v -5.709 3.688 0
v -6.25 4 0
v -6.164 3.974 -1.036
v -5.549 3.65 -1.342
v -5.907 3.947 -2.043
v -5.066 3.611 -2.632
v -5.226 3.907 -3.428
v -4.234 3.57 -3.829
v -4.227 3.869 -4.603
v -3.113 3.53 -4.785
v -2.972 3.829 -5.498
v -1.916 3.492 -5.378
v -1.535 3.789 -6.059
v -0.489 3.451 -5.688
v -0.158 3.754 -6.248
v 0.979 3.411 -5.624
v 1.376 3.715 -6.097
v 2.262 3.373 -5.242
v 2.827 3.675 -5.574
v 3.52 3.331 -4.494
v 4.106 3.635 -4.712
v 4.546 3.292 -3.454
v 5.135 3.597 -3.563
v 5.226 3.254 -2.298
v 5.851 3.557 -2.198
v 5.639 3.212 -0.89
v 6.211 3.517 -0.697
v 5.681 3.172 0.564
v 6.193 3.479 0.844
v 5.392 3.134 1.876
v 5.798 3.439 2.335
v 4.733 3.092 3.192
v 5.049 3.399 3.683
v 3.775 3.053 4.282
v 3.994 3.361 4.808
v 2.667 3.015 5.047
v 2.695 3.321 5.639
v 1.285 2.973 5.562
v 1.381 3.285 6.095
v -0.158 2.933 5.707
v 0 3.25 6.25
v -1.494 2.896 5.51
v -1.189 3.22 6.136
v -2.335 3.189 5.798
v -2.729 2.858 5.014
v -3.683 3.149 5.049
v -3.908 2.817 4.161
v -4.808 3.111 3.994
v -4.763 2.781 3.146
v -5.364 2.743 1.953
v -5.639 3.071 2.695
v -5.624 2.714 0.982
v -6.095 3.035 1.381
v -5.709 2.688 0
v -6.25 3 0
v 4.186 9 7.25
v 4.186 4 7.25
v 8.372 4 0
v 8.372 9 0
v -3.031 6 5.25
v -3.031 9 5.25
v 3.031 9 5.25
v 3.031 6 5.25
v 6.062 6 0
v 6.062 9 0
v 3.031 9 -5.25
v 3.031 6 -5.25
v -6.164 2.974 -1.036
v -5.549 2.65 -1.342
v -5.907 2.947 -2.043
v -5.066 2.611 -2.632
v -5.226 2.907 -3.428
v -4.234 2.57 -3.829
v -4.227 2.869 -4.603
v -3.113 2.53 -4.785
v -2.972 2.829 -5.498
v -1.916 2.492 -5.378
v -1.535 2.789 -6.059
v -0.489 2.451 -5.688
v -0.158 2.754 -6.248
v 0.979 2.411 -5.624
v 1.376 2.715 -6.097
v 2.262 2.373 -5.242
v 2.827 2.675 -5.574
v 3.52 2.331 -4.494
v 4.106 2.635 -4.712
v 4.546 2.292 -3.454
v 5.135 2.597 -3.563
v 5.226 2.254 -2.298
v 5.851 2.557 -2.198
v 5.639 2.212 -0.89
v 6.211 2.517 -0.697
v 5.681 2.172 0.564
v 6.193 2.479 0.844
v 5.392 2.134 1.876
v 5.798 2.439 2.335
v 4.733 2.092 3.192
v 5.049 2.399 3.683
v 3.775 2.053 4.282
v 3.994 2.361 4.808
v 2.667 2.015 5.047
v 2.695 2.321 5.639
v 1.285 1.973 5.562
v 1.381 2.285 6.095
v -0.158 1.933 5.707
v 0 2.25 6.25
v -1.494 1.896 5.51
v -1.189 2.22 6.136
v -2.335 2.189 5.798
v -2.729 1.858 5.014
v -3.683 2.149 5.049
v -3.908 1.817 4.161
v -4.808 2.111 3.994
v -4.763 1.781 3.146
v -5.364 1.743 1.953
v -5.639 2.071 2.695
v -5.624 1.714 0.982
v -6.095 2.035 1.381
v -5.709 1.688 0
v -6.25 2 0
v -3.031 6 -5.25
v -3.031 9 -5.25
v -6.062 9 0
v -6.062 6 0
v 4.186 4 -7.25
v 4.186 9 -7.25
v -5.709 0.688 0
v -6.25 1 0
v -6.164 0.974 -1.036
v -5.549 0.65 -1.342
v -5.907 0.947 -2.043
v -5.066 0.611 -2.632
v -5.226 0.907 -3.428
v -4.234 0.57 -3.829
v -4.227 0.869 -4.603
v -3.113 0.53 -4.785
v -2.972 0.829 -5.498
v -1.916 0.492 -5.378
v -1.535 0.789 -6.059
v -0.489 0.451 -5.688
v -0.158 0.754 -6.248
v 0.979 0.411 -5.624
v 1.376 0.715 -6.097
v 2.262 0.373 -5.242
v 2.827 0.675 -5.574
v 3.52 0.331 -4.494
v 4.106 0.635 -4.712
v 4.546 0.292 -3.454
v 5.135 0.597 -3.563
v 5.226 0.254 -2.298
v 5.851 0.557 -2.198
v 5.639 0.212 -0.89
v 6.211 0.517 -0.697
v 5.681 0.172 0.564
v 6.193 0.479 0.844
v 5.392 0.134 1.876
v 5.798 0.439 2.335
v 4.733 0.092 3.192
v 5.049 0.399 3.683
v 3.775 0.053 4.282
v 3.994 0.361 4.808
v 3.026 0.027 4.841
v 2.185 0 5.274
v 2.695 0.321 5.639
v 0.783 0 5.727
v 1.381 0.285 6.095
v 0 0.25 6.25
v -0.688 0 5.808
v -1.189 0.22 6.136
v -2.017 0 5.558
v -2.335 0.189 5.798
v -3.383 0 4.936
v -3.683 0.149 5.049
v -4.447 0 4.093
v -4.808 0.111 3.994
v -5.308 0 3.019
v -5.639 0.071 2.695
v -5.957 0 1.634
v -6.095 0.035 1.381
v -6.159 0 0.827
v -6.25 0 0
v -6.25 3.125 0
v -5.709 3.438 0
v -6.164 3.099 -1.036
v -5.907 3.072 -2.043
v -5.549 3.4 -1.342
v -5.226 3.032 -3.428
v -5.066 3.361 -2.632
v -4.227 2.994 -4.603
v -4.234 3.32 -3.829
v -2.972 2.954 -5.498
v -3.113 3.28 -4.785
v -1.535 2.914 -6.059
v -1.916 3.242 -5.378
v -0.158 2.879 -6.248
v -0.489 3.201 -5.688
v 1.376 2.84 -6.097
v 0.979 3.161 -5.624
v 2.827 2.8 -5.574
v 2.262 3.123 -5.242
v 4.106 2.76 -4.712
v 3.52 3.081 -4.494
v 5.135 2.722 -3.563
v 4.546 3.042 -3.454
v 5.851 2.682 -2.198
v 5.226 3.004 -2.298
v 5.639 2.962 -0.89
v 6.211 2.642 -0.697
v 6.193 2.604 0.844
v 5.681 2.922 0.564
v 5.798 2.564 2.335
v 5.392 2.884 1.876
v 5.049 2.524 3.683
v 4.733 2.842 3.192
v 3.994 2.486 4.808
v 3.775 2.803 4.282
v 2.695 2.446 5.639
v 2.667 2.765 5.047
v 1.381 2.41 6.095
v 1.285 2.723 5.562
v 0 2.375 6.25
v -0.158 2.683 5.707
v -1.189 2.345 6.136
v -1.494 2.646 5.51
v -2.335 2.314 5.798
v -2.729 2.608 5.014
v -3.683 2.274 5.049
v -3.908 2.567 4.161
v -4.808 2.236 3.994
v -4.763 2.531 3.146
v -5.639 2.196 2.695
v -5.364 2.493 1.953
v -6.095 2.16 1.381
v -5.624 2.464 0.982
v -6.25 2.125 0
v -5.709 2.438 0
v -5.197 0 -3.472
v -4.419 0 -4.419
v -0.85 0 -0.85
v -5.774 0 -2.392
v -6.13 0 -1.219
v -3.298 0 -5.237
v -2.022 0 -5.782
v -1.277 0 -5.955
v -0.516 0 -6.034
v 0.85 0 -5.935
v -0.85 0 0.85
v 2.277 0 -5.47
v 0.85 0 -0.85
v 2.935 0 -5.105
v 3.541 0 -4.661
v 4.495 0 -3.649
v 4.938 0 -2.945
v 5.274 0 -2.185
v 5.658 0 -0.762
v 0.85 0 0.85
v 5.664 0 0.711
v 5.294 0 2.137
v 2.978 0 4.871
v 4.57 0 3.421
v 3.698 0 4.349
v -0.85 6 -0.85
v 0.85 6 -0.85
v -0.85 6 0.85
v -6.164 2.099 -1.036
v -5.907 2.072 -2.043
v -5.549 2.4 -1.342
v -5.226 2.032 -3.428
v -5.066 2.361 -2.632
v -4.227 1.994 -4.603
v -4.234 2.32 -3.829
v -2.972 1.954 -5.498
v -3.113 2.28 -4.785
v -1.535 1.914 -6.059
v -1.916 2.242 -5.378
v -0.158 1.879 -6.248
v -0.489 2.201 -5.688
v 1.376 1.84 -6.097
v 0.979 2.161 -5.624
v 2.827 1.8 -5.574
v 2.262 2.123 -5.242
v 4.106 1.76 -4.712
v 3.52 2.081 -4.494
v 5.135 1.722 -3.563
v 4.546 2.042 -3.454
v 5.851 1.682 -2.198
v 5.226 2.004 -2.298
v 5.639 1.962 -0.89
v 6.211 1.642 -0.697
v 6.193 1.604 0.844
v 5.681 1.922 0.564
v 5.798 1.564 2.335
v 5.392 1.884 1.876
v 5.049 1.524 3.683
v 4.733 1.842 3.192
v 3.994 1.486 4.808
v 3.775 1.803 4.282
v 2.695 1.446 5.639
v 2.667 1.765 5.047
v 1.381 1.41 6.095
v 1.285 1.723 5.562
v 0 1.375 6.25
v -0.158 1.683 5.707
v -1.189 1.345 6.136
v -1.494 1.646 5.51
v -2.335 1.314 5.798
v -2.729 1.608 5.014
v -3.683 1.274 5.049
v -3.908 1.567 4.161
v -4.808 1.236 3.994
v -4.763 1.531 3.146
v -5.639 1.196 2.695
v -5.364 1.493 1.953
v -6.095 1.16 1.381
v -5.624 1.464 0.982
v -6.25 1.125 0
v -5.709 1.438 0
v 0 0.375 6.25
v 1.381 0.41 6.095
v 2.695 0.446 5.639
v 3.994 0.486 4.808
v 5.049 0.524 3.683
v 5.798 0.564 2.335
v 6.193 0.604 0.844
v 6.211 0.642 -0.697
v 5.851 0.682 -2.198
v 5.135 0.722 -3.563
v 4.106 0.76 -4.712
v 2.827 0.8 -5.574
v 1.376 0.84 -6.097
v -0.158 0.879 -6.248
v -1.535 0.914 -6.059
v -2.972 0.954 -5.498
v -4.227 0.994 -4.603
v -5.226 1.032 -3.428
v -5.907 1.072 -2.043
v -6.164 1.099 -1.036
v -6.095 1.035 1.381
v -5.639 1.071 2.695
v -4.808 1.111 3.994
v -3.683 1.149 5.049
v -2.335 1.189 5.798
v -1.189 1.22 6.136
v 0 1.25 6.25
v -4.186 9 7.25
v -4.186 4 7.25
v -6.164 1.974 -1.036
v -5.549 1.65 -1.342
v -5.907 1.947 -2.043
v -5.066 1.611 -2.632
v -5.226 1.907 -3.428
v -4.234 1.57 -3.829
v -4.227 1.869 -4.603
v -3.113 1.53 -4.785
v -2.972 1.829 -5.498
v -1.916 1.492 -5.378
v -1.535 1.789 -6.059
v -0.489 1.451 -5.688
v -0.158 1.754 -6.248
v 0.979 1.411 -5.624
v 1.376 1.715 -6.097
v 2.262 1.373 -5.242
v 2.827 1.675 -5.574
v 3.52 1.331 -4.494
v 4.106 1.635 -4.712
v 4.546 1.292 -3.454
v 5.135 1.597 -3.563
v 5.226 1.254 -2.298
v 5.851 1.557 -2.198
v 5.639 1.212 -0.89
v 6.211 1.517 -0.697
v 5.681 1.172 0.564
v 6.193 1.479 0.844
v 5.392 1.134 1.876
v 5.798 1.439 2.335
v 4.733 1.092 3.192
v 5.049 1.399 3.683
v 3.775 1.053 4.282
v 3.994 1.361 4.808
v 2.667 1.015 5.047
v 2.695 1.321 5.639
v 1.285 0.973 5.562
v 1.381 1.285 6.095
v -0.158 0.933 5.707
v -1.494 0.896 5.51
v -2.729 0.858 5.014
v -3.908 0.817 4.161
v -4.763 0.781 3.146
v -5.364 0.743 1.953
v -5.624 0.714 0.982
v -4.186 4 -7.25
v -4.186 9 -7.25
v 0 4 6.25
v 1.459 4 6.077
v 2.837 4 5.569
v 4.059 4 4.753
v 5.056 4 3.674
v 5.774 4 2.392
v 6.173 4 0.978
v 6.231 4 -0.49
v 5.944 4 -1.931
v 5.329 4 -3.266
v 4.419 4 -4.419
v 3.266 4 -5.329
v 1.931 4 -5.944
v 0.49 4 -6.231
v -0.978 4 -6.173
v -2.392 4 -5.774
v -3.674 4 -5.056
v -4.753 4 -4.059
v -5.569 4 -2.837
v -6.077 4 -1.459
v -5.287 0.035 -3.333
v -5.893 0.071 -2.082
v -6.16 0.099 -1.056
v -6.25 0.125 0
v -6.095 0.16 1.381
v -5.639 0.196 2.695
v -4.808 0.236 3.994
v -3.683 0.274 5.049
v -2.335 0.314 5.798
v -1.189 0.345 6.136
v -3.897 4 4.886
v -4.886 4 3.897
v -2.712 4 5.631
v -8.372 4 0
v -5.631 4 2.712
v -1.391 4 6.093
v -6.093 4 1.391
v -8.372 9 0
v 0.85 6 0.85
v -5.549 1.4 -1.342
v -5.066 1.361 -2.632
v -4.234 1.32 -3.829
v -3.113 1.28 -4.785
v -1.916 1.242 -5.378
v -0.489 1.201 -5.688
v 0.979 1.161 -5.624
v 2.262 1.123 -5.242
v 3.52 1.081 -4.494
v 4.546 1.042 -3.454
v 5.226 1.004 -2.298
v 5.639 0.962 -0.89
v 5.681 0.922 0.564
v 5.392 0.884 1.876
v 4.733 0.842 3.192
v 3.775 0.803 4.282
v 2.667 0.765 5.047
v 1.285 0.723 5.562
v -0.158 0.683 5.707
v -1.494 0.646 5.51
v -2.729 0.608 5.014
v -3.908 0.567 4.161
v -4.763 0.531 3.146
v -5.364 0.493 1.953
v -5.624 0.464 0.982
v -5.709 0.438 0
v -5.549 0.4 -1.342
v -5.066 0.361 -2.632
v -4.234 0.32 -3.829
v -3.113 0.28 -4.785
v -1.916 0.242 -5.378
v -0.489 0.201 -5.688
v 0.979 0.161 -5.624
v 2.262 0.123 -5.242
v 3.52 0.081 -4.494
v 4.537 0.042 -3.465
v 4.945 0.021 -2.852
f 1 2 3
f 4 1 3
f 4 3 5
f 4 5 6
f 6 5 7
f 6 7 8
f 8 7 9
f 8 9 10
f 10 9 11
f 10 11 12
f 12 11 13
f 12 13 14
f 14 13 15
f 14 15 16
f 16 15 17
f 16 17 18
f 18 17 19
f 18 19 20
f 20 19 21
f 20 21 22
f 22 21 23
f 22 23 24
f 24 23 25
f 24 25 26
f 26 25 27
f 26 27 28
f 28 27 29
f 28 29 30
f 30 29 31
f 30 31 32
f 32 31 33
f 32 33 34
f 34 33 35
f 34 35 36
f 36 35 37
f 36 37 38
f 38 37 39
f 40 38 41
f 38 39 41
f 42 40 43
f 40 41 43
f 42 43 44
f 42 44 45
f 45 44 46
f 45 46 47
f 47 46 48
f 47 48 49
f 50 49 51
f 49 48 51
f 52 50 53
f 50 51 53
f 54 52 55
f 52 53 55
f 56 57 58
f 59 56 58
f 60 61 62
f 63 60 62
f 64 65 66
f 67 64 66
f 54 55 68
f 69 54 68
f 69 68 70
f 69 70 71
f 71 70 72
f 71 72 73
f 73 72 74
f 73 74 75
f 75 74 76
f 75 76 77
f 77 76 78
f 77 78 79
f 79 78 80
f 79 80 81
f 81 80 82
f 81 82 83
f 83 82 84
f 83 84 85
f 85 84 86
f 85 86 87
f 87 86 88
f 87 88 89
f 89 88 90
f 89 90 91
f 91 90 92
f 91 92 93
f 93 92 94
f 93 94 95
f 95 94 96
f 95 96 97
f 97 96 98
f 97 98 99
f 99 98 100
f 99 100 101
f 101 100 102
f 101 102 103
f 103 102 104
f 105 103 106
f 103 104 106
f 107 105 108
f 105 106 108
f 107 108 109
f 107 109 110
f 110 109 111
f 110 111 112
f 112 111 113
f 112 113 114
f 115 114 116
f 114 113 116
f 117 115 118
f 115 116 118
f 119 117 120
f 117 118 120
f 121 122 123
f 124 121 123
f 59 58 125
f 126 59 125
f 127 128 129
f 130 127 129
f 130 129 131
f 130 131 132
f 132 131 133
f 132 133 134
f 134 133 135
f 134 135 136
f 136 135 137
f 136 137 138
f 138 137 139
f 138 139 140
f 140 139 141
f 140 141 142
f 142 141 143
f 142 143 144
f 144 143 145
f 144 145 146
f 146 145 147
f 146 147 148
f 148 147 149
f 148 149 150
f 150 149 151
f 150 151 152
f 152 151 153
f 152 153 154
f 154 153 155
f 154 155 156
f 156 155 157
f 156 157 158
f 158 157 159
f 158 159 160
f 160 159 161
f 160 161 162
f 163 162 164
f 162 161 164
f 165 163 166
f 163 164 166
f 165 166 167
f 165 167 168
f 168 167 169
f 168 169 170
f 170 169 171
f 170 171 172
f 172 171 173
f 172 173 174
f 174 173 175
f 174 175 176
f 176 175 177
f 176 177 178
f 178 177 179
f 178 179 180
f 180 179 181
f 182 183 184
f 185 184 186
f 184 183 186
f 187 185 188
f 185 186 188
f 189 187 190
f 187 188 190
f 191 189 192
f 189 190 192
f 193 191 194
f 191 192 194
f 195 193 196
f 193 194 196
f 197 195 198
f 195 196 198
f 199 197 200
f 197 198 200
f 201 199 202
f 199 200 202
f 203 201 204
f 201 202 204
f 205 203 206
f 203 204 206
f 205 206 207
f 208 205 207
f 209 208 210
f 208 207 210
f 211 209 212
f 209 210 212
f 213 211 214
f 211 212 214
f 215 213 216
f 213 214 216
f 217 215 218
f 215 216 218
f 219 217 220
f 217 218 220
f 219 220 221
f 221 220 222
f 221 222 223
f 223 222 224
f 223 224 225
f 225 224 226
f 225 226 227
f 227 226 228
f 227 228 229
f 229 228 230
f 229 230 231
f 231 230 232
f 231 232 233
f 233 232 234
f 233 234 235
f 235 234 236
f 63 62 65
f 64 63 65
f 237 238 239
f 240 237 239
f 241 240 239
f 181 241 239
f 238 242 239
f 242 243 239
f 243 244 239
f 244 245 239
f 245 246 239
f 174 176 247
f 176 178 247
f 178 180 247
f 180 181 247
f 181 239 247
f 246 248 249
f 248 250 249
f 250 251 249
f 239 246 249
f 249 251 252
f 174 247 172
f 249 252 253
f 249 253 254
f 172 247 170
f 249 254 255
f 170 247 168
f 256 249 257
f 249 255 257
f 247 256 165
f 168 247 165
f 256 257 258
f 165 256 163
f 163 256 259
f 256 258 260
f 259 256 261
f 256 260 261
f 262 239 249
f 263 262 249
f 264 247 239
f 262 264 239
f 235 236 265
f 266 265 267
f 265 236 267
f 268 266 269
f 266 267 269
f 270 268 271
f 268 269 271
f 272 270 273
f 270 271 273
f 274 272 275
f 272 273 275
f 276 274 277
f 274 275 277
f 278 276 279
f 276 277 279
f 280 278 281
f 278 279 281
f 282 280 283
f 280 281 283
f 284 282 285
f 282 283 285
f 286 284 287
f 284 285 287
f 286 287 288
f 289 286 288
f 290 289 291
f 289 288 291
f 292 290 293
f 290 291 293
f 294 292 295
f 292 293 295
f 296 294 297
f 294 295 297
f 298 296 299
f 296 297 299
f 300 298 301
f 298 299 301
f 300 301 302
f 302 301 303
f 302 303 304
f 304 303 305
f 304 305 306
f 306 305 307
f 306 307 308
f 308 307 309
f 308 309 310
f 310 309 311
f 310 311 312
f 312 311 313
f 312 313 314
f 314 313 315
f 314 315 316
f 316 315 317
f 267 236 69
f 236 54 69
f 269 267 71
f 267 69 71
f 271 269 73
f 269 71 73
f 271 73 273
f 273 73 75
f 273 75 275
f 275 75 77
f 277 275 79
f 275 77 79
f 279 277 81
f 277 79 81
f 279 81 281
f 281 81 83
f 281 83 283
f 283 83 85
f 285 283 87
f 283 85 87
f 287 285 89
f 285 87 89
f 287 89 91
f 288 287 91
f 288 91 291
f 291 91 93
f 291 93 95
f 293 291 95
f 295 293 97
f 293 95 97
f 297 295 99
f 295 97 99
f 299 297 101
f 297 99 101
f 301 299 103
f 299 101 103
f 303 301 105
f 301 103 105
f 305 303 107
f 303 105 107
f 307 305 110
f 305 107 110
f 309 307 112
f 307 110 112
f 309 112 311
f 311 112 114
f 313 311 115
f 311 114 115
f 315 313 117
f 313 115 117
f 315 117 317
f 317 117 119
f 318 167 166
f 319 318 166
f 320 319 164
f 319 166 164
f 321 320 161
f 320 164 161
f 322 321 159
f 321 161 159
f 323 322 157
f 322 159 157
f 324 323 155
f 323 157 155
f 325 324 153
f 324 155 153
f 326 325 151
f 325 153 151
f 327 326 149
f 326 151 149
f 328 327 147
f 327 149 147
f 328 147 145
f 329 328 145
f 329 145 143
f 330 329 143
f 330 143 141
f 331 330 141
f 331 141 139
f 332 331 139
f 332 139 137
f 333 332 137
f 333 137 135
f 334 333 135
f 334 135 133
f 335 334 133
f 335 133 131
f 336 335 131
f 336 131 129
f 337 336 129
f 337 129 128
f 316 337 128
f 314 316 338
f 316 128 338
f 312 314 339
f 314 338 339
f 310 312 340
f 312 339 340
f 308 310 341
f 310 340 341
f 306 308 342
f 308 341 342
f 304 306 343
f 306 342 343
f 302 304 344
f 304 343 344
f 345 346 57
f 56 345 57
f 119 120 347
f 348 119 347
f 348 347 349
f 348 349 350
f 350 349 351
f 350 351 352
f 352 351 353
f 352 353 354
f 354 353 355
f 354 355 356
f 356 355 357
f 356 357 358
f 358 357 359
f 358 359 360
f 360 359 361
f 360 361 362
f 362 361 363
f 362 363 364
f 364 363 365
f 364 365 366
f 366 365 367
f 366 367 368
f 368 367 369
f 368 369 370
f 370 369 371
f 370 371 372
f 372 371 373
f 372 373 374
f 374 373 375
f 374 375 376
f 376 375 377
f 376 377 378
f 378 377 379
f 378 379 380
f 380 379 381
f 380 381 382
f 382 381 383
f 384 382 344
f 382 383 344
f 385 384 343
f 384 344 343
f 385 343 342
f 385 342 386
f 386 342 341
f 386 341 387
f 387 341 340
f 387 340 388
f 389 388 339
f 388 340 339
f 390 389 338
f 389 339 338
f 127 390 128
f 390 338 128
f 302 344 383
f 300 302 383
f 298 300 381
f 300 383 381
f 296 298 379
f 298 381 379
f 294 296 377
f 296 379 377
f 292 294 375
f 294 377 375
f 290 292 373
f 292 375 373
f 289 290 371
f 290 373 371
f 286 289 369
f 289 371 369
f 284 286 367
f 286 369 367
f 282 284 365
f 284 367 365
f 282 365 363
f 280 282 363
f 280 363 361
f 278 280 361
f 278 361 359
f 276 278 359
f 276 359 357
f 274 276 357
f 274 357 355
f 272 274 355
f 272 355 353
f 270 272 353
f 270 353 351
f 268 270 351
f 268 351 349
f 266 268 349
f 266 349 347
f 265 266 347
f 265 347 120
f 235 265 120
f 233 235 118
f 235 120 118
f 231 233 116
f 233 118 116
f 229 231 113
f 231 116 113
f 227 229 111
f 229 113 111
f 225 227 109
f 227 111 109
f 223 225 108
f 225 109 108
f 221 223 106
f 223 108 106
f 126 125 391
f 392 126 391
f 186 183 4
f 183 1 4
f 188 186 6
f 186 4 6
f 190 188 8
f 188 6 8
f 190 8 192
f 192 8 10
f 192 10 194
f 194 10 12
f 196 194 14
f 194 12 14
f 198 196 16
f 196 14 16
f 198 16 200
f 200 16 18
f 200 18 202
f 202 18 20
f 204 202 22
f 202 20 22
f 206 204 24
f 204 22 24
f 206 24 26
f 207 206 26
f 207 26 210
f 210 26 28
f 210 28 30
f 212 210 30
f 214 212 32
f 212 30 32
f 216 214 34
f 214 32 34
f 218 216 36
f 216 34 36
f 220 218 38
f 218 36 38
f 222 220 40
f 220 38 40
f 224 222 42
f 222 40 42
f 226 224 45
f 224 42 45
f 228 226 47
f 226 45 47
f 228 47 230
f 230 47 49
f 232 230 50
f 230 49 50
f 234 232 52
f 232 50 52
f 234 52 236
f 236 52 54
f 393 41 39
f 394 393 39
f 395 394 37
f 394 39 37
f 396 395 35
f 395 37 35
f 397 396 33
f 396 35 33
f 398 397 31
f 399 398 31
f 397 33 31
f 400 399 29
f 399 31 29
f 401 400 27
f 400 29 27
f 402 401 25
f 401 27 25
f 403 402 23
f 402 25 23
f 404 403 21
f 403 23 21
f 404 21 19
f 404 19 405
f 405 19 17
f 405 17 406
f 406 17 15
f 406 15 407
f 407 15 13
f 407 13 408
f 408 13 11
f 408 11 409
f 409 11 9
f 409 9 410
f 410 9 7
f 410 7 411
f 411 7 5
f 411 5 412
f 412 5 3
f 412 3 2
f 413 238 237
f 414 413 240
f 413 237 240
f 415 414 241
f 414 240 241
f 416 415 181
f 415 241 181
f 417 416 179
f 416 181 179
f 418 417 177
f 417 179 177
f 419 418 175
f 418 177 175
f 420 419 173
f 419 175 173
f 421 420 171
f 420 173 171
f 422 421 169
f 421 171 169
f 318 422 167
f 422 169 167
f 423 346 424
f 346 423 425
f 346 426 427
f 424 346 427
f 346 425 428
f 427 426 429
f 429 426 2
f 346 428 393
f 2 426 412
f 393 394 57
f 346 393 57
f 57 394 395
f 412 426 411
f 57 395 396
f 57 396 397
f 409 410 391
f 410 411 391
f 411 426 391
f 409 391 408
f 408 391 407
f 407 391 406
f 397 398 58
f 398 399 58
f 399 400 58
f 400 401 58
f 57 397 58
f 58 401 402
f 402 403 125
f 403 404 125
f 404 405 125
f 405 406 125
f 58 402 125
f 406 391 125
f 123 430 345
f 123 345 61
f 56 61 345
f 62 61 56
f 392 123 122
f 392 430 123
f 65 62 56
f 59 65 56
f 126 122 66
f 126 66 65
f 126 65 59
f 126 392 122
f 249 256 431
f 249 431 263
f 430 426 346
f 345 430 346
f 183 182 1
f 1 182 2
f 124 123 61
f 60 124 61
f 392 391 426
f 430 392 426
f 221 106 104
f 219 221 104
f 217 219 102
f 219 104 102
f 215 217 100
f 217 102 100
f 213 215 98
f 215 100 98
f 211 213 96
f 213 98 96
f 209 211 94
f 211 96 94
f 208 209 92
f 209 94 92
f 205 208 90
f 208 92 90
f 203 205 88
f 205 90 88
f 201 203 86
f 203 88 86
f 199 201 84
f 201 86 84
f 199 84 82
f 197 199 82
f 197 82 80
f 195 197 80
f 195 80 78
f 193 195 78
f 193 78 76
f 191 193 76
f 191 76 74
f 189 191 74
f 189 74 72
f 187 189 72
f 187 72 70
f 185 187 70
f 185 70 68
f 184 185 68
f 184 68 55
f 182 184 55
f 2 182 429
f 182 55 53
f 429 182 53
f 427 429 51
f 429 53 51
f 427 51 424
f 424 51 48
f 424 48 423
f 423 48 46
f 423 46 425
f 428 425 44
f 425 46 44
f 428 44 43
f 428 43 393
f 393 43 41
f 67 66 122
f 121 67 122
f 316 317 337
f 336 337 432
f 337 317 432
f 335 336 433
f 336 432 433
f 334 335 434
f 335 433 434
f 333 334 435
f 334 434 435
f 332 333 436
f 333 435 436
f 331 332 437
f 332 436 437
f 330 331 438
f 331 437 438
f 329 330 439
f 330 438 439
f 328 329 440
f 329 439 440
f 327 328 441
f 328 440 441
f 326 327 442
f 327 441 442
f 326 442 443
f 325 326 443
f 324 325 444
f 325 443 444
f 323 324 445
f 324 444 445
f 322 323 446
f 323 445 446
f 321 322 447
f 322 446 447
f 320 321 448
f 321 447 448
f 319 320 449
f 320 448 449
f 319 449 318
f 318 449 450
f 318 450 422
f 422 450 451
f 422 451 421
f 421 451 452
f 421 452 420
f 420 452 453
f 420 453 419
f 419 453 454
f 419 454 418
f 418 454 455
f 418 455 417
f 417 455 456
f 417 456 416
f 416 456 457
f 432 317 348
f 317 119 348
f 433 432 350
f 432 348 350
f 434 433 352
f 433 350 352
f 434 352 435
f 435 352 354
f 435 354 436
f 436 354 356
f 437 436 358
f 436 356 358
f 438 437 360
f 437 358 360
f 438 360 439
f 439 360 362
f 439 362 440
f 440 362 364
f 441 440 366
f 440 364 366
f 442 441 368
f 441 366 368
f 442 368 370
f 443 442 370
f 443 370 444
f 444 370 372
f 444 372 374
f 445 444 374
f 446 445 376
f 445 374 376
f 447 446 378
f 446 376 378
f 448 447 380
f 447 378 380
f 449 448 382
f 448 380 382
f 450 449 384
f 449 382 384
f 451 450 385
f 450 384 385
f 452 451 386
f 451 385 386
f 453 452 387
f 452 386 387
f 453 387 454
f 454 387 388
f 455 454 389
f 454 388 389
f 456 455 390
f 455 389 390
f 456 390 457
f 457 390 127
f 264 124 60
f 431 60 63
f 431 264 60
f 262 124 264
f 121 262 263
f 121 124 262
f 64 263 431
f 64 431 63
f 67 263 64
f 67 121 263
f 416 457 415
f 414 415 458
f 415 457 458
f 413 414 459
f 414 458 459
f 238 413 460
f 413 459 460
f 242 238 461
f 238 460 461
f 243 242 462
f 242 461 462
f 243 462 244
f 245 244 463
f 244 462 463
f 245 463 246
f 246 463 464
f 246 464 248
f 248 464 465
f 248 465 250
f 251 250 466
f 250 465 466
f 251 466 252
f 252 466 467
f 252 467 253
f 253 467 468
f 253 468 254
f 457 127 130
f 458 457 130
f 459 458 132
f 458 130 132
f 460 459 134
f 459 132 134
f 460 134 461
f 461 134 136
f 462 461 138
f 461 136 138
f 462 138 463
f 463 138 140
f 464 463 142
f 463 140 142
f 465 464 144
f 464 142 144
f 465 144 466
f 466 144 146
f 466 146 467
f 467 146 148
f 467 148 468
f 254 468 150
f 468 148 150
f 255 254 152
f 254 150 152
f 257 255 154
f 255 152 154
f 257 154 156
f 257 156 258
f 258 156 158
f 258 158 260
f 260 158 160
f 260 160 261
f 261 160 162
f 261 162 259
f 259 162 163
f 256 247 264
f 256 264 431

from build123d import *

# Parameters (mm, degrees)
SKETCH1_R               = 6.25
BOSS_EXTRUDE1_DEPTH     = 4
THREAD1_PITCH           = 1
BOSS_EXTRUDE2_DEPTH     = 5
CUT_EXTRUDE1_DEPTH      = 3
CUT_EXTRUDE2_DEPTH      = 13.59546881
CUT_EXTRUDE2_DEPTH_BACK = 13.59546881
SKETCH6_W               = 1.7
SKETCH6_H               = 1.7


with BuildPart() as part:
    # Sketch1 → Boss-Extrude1 (new body)
    with BuildSketch(Plane(origin=(0, 0, 0), x_dir=(1, 0, 0), z_dir=(0, 1, 0))):
        with Locations(Location((0, 0, 0), (0, 0, 270))):
            Circle(SKETCH1_R)
    extrude(amount=BOSS_EXTRUDE1_DEPTH)

    # Thread1: the profile of Thread Profile1 profile screwed along a right-hand helix of 4 turns, 8 arcs to a turn; built about Z, then put on its axis
    thread1_z = Axis((0, 0, 0), (0, 0, 1))
    thread1_corners = [(6.2503, 0, -0.000173205), (6.2503, 0, 0.875173202), (5.708734125, 0, 0.562499999), (5.708734125, 0, 0.312499999)]
    with BuildLine(mode=Mode.PRIVATE) as thread1_profile:
        Line(thread1_corners[0], thread1_corners[1])
        Line(thread1_corners[1], thread1_corners[2])
        Line(thread1_corners[2], thread1_corners[3])
        Line(thread1_corners[3], thread1_corners[0])
    thread1_cap = Face(thread1_profile.wire())
    thread1_turn_angles = [0, 22.5, 45, 67.5, 90, 112.5, 135, 157.5, 180, 202.5, 225, 247.5, 270, 292.5, 315, 337.5, 360]
    thread1_turn_weights = [1, 0.9238795325112867, 1, 0.9238795325112867, 1, 0.9238795325112867, 1, 0.9238795325112867, 1, 0.9238795325112867, 1, 0.9238795325112867, 1, 0.9238795325112867, 1, 0.9238795325112867, 1]
    thread1_turn_rails = [Edge.make_bspline([Vector(p[0], p[1], 0).rotate(thread1_z, thread1_turn_angles[k]) / thread1_turn_weights[k] + Vector(0, 0, p[2] + THREAD1_PITCH * thread1_turn_angles[k] / 360) for k in range(17)], [0, 0, 0, 1, 1, 2, 2, 3, 3, 4, 4, 5, 5, 6, 6, 7, 7, 8, 8, 8], 2, thread1_turn_weights) for p in thread1_corners]
    thread1_turn_sides = [Face.make_surface_from_curves(thread1_turn_rails[p[0]], thread1_turn_rails[p[1]]) for p in [(0, 1), (1, 2), (2, 3), (3, 0)]]
    thread1 = Plane(origin=(0, 4, 0), x_dir=(-1, 0, 0), z_dir=(0, -1, 0)) * Solid(Shell([*[p.moved(Location((0, 0, THREAD1_PITCH * i))) for i in range(4) for p in thread1_turn_sides], thread1_cap, thread1_cap.rotate(thread1_z, 1440).moved(Location((0, 0, THREAD1_PITCH * 1440 / 360)))]))
    add(thread1, mode=Mode.SUBTRACT)

    # Sketch4 → Boss-Extrude2 (add)
    with BuildSketch(Plane(origin=(0, 4, 0), x_dir=(1, 0, 0), z_dir=(0, 1, 0))):
        Polygon((8.371578903, 0), (4.185789452, 7.25), (-4.185789452, 7.25), (-8.371578903, 0), (-4.185789452, -7.25), (4.185789452, -7.25), align=None)
    extrude(amount=BOSS_EXTRUDE2_DEPTH)

    # Sketch5 → Cut-Extrude1 (cut)
    with BuildSketch(Plane(origin=(0, 9, 0), x_dir=(1, 0, 0), z_dir=(0, 1, 0))):
        Polygon((3.031088913, 5.25), (-3.031088913, 5.25), (-6.062177826, 0), (-3.031088913, -5.25), (3.031088913, -5.25), (6.062177826, 0), align=None)
    extrude(amount=-CUT_EXTRUDE1_DEPTH, mode=Mode.SUBTRACT)

    # Sketch6 → Cut-Extrude2 (cut, two sides: drawn at the far end of the back side and taken through both)
    with BuildSketch(Plane(origin=(0, 6, 0), x_dir=(1, 0, 0), z_dir=(0, 1, 0)).offset(-CUT_EXTRUDE2_DEPTH_BACK)):
        Rectangle(SKETCH6_W, SKETCH6_H)
    extrude(amount=CUT_EXTRUDE2_DEPTH + CUT_EXTRUDE2_DEPTH_BACK, mode=Mode.SUBTRACT)


solid = part.part
